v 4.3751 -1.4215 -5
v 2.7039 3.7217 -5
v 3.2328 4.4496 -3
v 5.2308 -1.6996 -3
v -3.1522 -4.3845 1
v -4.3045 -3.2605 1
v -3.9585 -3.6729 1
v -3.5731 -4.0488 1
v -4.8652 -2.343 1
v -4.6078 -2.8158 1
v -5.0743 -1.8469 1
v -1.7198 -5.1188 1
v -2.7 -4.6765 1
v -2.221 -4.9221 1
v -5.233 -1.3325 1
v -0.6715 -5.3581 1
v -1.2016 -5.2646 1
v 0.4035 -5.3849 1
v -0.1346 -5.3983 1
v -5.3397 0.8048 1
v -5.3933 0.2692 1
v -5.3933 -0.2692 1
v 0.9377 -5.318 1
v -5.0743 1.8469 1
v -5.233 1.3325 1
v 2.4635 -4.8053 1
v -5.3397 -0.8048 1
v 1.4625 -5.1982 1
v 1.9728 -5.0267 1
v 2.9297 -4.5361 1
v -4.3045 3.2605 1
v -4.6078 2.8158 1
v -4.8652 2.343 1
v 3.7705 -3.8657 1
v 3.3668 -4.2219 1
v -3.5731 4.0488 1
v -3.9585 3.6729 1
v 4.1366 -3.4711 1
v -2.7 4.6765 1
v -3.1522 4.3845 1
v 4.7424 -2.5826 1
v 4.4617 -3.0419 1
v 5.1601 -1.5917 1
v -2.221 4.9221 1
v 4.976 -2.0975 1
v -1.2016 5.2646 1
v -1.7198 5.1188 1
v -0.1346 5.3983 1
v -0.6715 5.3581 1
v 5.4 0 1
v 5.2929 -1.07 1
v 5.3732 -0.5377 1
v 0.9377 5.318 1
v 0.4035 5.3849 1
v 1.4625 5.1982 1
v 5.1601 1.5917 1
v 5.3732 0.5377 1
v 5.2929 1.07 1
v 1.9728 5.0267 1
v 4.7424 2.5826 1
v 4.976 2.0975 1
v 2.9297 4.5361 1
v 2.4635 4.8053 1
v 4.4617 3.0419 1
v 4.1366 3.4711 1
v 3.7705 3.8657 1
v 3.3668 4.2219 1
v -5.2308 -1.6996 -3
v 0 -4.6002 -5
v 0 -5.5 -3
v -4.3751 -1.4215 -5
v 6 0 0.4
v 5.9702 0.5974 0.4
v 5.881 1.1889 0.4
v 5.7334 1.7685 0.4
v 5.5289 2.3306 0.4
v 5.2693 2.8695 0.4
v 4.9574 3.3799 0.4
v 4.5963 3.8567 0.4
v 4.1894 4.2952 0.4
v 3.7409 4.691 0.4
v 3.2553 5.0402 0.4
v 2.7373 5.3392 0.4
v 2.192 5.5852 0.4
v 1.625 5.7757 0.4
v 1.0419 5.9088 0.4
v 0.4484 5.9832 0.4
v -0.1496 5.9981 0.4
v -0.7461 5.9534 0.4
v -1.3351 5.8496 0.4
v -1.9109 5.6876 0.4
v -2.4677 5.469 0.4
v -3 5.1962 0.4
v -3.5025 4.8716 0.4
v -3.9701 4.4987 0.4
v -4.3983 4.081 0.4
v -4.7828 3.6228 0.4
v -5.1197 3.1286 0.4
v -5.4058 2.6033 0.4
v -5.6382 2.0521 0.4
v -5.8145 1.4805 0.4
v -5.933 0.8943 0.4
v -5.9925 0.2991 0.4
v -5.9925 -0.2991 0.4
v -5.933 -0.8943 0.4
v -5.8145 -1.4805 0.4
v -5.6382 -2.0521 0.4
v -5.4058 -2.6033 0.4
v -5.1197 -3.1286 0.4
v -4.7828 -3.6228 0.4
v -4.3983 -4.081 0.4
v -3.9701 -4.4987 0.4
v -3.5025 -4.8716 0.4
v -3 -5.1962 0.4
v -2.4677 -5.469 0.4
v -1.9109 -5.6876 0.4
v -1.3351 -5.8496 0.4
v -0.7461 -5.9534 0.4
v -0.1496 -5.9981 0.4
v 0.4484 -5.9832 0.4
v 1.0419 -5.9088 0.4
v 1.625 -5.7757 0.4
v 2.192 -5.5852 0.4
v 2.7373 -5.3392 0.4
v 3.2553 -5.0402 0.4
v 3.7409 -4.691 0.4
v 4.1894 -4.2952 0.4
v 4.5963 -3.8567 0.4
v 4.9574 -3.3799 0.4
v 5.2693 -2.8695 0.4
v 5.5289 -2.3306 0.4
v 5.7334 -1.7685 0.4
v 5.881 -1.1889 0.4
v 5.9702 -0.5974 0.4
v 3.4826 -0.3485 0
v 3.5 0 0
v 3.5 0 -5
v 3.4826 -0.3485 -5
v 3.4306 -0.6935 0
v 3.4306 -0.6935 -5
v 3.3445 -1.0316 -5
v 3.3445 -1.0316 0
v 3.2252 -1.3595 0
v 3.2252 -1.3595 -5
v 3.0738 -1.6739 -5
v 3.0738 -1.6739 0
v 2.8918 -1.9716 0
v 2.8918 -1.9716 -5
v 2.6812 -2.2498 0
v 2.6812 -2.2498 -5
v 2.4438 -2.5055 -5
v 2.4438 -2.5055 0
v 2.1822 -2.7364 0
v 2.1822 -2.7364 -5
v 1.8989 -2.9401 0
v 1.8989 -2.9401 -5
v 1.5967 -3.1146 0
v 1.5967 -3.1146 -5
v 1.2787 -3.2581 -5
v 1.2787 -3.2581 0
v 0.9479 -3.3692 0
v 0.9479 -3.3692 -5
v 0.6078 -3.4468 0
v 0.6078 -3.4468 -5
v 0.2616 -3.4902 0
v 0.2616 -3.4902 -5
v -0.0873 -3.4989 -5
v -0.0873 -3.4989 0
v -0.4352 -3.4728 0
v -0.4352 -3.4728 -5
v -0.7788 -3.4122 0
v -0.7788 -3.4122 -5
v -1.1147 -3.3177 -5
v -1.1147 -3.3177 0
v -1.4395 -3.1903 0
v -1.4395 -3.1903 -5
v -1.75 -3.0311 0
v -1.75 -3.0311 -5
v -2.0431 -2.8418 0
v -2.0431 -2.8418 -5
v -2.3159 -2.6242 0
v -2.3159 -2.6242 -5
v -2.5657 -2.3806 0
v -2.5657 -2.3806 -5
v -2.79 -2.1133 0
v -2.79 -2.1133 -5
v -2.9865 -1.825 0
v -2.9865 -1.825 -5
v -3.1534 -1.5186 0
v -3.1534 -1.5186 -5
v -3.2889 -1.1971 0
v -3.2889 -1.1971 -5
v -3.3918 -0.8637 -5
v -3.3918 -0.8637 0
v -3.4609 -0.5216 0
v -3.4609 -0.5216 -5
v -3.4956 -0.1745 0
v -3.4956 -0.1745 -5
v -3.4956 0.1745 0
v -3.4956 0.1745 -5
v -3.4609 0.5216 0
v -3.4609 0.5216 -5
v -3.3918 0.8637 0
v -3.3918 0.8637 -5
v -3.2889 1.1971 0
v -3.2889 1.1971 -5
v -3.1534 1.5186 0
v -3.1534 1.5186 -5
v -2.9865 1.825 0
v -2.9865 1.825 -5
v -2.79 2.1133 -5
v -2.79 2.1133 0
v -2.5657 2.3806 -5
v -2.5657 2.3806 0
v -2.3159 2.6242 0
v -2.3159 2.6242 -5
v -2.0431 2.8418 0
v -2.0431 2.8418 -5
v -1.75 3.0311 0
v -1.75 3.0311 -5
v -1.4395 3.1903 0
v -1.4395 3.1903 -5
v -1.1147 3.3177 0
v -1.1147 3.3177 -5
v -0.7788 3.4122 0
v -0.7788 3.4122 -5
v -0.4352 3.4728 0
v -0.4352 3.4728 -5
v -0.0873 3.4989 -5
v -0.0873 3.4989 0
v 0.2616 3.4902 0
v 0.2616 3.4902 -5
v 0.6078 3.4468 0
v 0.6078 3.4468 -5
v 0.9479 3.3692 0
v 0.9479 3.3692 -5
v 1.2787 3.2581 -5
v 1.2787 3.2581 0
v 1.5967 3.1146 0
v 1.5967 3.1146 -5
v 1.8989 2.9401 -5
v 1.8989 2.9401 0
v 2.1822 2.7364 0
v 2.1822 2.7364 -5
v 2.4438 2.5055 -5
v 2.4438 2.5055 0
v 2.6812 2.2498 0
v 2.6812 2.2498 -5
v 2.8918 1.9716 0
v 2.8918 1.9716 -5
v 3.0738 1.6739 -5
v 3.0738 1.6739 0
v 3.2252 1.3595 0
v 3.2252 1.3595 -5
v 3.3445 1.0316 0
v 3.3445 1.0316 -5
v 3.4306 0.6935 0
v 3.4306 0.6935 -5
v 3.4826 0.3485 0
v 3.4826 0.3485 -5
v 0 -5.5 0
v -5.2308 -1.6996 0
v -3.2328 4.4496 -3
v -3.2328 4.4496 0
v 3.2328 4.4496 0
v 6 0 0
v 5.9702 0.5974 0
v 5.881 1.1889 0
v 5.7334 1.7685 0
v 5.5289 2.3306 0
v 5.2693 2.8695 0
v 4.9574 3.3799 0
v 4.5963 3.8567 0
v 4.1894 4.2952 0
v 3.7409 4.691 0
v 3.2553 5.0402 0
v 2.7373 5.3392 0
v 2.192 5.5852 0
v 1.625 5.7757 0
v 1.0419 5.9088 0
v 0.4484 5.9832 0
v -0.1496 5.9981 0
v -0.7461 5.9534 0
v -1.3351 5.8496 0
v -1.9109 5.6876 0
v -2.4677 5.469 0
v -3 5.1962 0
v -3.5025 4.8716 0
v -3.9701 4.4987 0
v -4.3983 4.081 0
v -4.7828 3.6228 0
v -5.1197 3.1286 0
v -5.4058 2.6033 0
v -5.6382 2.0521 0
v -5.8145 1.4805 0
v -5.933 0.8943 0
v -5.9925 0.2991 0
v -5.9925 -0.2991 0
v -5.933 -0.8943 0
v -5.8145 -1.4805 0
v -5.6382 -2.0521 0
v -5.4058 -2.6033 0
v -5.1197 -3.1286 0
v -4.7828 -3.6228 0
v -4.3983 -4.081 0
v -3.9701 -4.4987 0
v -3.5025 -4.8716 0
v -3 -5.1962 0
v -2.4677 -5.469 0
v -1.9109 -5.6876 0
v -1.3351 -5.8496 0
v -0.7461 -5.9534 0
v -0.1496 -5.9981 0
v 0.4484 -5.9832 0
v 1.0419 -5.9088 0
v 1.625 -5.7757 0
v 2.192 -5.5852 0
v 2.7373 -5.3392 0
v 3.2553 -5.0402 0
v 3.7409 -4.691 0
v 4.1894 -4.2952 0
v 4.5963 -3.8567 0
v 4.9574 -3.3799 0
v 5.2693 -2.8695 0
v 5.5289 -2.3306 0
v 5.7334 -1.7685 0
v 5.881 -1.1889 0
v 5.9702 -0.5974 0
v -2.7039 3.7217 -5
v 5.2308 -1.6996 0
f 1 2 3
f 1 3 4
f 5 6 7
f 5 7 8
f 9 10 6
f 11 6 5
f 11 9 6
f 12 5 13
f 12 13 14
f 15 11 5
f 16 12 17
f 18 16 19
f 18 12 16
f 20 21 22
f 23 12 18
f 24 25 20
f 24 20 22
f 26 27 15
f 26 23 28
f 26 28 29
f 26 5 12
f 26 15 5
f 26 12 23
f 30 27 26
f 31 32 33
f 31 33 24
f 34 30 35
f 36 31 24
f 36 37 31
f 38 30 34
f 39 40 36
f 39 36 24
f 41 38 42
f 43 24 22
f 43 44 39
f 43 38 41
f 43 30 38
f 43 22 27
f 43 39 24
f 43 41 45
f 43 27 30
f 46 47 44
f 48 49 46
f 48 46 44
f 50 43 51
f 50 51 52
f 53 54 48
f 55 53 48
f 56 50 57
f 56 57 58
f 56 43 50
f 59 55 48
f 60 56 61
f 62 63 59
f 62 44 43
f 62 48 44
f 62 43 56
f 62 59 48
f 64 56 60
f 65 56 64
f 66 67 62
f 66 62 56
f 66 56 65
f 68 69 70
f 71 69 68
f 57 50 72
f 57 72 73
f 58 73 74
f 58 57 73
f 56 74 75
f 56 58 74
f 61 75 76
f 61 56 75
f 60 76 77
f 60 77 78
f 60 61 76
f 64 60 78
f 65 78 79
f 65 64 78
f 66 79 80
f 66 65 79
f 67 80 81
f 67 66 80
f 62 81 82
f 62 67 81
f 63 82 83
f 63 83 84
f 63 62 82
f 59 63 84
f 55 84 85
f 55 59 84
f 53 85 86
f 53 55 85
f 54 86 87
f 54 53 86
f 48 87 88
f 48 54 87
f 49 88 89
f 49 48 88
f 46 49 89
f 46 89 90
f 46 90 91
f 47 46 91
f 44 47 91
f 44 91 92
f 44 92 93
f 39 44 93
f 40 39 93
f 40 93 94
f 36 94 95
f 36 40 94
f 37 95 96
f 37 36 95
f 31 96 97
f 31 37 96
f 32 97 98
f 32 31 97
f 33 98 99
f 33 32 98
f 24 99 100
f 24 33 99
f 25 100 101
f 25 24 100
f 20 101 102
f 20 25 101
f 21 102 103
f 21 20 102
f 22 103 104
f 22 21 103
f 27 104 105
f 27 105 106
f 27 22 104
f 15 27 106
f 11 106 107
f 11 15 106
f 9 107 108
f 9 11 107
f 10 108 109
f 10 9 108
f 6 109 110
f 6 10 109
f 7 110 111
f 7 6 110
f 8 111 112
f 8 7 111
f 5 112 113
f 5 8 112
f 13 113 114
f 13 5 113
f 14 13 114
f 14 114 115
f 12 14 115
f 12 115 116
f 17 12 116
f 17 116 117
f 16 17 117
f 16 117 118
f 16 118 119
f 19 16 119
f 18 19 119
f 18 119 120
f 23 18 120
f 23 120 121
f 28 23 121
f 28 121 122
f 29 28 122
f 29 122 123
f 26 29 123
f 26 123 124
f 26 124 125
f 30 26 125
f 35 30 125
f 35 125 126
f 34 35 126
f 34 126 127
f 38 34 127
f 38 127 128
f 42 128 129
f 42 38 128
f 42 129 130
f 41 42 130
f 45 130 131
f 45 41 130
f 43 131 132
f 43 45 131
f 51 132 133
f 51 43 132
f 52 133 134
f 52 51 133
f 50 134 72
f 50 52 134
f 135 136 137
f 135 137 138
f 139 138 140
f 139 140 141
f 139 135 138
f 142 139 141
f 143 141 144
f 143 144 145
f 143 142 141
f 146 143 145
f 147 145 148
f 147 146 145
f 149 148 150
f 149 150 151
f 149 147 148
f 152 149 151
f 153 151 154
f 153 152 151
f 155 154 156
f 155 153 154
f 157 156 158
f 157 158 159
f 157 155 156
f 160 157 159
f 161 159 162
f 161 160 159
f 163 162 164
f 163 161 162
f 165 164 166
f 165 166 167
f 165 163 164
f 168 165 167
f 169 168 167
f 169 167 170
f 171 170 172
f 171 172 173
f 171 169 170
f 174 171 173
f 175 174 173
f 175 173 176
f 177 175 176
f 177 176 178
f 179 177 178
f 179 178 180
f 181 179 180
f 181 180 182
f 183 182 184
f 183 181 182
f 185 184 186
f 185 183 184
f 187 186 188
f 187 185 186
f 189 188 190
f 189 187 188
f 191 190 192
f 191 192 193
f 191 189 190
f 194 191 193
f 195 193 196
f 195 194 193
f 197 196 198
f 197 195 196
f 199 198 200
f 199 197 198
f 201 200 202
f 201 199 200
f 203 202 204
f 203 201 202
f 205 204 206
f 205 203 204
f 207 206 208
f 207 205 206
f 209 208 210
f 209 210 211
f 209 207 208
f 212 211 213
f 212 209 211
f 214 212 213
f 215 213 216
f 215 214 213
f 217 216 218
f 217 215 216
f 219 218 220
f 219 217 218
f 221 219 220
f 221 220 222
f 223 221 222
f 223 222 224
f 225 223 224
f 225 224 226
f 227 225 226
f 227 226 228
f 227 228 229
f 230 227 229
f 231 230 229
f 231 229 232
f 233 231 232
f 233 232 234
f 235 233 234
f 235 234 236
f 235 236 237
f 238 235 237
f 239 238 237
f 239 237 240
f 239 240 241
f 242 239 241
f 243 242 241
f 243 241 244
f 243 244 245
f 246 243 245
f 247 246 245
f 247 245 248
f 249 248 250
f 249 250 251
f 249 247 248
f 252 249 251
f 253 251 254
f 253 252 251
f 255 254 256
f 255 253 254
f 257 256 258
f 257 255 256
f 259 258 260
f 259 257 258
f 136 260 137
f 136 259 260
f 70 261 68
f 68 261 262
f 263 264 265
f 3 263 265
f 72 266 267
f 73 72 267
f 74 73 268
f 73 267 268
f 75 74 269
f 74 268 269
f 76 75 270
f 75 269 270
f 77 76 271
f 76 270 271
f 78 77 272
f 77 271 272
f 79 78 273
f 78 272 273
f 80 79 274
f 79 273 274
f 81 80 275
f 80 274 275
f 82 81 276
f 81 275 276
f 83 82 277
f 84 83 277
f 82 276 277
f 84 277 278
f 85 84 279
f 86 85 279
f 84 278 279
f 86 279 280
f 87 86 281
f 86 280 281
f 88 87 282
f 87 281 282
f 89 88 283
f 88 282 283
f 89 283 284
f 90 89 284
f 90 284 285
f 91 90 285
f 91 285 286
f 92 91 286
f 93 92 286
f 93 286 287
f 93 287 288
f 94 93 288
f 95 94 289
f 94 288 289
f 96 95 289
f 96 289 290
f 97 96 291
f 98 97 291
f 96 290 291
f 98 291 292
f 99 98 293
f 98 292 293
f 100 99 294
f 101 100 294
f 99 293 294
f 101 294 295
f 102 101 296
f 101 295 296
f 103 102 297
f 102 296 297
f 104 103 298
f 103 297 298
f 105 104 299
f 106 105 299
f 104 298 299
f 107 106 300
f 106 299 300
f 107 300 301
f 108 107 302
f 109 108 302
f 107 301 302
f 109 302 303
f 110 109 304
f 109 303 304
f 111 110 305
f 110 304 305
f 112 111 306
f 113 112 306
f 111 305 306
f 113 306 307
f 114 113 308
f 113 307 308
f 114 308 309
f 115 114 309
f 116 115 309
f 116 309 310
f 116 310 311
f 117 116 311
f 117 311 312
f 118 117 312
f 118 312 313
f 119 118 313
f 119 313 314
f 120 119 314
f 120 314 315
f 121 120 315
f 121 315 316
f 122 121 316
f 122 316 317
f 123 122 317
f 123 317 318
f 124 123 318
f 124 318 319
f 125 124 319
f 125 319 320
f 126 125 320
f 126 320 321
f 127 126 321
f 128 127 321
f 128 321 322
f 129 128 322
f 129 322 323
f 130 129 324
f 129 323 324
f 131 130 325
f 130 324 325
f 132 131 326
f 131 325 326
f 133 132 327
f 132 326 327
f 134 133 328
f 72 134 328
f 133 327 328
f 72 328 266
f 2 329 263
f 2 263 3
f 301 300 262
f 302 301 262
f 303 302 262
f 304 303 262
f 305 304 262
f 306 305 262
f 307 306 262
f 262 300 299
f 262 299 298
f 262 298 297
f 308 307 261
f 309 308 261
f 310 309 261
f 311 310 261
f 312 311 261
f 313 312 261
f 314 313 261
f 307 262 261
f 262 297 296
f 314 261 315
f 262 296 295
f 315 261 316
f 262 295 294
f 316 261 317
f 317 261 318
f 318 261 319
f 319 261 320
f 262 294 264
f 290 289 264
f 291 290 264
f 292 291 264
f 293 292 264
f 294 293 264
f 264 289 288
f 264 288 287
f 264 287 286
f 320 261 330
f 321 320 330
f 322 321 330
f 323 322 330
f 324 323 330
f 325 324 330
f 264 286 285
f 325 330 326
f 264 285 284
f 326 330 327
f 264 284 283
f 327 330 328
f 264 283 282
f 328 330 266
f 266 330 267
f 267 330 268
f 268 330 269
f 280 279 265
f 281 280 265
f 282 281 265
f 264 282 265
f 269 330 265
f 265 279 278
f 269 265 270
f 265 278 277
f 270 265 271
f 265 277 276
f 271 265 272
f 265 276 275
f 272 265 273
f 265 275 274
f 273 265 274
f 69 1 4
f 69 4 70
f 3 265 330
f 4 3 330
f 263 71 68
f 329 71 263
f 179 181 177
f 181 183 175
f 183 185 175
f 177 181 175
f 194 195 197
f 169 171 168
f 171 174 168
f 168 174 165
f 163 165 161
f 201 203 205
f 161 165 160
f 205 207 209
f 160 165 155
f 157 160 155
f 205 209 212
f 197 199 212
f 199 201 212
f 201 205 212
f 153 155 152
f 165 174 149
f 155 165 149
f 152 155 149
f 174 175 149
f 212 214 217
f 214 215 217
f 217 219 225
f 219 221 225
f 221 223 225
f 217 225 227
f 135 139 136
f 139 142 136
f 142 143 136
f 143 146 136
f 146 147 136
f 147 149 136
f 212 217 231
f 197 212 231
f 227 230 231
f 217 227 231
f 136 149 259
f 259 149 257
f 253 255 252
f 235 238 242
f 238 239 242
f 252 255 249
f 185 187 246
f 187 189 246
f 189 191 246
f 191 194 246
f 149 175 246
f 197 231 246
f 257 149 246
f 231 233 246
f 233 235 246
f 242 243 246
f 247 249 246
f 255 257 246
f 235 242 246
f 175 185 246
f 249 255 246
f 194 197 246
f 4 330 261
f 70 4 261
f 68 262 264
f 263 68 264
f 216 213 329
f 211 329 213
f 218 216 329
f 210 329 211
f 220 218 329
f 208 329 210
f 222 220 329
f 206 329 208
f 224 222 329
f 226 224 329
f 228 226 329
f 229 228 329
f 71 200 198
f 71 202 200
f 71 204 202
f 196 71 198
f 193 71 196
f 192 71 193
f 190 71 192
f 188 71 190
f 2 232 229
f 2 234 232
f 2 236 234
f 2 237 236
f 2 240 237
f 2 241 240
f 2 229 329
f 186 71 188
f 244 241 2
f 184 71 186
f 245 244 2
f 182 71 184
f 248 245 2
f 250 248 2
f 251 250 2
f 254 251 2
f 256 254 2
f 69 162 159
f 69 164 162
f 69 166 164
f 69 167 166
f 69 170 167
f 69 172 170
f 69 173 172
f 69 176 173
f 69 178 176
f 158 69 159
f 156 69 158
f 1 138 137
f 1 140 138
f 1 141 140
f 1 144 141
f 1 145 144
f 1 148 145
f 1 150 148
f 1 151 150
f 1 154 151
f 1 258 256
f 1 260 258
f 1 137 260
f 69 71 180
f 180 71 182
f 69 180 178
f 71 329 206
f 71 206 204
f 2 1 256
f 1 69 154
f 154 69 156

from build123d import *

# Parameters (mm, degrees)
F0_R     = 6
F1_DEPTH = 1
F2_SIZE  = 0.6
F3_R     = 3.5
F4_DEPTH = 5
F5_SIZE2 = 0.72794
F5_SIZE  = 2


with BuildPart() as f1:
    # F0 (on Top) → F1 (new body)
    with BuildSketch(Plane.XY):
        Circle(F0_R)
    extrude(amount=F1_DEPTH)

    # F2
    f2_edges = [f1.edges().sort_by_distance(p)[0] for p in [
        (-6, 0, 1),
    ]]
    chamfer(f2_edges, length=F2_SIZE)

    # F3 (on face) → F4 (join)
    with BuildSketch(Plane(origin=(0, 0, 0), x_dir=(1, 0, 0), z_dir=(0, 0, -1))):
        Polygon((5.230811, 1.699593), (0, 5.5), (-5.230811, 1.699593), (-3.232819, -4.449593), (3.232819, -4.449593), align=None)
        Circle(F3_R, mode=Mode.SUBTRACT)
    extrude(amount=F4_DEPTH)

    # F5
    f5_edges = [f1.edges().sort_by_distance(p)[0] for p in [
        (-2.615405, -3.599797, -5),
        (-4.231815, 1.375, -5),
        (0, 4.449593, -5),
        (4.231815, 1.375, -5),
        (2.615405, -3.599797, -5),
    ]]
    chamfer(f5_edges, length=F5_SIZE, length2=F5_SIZE2)


solid = f1.part
